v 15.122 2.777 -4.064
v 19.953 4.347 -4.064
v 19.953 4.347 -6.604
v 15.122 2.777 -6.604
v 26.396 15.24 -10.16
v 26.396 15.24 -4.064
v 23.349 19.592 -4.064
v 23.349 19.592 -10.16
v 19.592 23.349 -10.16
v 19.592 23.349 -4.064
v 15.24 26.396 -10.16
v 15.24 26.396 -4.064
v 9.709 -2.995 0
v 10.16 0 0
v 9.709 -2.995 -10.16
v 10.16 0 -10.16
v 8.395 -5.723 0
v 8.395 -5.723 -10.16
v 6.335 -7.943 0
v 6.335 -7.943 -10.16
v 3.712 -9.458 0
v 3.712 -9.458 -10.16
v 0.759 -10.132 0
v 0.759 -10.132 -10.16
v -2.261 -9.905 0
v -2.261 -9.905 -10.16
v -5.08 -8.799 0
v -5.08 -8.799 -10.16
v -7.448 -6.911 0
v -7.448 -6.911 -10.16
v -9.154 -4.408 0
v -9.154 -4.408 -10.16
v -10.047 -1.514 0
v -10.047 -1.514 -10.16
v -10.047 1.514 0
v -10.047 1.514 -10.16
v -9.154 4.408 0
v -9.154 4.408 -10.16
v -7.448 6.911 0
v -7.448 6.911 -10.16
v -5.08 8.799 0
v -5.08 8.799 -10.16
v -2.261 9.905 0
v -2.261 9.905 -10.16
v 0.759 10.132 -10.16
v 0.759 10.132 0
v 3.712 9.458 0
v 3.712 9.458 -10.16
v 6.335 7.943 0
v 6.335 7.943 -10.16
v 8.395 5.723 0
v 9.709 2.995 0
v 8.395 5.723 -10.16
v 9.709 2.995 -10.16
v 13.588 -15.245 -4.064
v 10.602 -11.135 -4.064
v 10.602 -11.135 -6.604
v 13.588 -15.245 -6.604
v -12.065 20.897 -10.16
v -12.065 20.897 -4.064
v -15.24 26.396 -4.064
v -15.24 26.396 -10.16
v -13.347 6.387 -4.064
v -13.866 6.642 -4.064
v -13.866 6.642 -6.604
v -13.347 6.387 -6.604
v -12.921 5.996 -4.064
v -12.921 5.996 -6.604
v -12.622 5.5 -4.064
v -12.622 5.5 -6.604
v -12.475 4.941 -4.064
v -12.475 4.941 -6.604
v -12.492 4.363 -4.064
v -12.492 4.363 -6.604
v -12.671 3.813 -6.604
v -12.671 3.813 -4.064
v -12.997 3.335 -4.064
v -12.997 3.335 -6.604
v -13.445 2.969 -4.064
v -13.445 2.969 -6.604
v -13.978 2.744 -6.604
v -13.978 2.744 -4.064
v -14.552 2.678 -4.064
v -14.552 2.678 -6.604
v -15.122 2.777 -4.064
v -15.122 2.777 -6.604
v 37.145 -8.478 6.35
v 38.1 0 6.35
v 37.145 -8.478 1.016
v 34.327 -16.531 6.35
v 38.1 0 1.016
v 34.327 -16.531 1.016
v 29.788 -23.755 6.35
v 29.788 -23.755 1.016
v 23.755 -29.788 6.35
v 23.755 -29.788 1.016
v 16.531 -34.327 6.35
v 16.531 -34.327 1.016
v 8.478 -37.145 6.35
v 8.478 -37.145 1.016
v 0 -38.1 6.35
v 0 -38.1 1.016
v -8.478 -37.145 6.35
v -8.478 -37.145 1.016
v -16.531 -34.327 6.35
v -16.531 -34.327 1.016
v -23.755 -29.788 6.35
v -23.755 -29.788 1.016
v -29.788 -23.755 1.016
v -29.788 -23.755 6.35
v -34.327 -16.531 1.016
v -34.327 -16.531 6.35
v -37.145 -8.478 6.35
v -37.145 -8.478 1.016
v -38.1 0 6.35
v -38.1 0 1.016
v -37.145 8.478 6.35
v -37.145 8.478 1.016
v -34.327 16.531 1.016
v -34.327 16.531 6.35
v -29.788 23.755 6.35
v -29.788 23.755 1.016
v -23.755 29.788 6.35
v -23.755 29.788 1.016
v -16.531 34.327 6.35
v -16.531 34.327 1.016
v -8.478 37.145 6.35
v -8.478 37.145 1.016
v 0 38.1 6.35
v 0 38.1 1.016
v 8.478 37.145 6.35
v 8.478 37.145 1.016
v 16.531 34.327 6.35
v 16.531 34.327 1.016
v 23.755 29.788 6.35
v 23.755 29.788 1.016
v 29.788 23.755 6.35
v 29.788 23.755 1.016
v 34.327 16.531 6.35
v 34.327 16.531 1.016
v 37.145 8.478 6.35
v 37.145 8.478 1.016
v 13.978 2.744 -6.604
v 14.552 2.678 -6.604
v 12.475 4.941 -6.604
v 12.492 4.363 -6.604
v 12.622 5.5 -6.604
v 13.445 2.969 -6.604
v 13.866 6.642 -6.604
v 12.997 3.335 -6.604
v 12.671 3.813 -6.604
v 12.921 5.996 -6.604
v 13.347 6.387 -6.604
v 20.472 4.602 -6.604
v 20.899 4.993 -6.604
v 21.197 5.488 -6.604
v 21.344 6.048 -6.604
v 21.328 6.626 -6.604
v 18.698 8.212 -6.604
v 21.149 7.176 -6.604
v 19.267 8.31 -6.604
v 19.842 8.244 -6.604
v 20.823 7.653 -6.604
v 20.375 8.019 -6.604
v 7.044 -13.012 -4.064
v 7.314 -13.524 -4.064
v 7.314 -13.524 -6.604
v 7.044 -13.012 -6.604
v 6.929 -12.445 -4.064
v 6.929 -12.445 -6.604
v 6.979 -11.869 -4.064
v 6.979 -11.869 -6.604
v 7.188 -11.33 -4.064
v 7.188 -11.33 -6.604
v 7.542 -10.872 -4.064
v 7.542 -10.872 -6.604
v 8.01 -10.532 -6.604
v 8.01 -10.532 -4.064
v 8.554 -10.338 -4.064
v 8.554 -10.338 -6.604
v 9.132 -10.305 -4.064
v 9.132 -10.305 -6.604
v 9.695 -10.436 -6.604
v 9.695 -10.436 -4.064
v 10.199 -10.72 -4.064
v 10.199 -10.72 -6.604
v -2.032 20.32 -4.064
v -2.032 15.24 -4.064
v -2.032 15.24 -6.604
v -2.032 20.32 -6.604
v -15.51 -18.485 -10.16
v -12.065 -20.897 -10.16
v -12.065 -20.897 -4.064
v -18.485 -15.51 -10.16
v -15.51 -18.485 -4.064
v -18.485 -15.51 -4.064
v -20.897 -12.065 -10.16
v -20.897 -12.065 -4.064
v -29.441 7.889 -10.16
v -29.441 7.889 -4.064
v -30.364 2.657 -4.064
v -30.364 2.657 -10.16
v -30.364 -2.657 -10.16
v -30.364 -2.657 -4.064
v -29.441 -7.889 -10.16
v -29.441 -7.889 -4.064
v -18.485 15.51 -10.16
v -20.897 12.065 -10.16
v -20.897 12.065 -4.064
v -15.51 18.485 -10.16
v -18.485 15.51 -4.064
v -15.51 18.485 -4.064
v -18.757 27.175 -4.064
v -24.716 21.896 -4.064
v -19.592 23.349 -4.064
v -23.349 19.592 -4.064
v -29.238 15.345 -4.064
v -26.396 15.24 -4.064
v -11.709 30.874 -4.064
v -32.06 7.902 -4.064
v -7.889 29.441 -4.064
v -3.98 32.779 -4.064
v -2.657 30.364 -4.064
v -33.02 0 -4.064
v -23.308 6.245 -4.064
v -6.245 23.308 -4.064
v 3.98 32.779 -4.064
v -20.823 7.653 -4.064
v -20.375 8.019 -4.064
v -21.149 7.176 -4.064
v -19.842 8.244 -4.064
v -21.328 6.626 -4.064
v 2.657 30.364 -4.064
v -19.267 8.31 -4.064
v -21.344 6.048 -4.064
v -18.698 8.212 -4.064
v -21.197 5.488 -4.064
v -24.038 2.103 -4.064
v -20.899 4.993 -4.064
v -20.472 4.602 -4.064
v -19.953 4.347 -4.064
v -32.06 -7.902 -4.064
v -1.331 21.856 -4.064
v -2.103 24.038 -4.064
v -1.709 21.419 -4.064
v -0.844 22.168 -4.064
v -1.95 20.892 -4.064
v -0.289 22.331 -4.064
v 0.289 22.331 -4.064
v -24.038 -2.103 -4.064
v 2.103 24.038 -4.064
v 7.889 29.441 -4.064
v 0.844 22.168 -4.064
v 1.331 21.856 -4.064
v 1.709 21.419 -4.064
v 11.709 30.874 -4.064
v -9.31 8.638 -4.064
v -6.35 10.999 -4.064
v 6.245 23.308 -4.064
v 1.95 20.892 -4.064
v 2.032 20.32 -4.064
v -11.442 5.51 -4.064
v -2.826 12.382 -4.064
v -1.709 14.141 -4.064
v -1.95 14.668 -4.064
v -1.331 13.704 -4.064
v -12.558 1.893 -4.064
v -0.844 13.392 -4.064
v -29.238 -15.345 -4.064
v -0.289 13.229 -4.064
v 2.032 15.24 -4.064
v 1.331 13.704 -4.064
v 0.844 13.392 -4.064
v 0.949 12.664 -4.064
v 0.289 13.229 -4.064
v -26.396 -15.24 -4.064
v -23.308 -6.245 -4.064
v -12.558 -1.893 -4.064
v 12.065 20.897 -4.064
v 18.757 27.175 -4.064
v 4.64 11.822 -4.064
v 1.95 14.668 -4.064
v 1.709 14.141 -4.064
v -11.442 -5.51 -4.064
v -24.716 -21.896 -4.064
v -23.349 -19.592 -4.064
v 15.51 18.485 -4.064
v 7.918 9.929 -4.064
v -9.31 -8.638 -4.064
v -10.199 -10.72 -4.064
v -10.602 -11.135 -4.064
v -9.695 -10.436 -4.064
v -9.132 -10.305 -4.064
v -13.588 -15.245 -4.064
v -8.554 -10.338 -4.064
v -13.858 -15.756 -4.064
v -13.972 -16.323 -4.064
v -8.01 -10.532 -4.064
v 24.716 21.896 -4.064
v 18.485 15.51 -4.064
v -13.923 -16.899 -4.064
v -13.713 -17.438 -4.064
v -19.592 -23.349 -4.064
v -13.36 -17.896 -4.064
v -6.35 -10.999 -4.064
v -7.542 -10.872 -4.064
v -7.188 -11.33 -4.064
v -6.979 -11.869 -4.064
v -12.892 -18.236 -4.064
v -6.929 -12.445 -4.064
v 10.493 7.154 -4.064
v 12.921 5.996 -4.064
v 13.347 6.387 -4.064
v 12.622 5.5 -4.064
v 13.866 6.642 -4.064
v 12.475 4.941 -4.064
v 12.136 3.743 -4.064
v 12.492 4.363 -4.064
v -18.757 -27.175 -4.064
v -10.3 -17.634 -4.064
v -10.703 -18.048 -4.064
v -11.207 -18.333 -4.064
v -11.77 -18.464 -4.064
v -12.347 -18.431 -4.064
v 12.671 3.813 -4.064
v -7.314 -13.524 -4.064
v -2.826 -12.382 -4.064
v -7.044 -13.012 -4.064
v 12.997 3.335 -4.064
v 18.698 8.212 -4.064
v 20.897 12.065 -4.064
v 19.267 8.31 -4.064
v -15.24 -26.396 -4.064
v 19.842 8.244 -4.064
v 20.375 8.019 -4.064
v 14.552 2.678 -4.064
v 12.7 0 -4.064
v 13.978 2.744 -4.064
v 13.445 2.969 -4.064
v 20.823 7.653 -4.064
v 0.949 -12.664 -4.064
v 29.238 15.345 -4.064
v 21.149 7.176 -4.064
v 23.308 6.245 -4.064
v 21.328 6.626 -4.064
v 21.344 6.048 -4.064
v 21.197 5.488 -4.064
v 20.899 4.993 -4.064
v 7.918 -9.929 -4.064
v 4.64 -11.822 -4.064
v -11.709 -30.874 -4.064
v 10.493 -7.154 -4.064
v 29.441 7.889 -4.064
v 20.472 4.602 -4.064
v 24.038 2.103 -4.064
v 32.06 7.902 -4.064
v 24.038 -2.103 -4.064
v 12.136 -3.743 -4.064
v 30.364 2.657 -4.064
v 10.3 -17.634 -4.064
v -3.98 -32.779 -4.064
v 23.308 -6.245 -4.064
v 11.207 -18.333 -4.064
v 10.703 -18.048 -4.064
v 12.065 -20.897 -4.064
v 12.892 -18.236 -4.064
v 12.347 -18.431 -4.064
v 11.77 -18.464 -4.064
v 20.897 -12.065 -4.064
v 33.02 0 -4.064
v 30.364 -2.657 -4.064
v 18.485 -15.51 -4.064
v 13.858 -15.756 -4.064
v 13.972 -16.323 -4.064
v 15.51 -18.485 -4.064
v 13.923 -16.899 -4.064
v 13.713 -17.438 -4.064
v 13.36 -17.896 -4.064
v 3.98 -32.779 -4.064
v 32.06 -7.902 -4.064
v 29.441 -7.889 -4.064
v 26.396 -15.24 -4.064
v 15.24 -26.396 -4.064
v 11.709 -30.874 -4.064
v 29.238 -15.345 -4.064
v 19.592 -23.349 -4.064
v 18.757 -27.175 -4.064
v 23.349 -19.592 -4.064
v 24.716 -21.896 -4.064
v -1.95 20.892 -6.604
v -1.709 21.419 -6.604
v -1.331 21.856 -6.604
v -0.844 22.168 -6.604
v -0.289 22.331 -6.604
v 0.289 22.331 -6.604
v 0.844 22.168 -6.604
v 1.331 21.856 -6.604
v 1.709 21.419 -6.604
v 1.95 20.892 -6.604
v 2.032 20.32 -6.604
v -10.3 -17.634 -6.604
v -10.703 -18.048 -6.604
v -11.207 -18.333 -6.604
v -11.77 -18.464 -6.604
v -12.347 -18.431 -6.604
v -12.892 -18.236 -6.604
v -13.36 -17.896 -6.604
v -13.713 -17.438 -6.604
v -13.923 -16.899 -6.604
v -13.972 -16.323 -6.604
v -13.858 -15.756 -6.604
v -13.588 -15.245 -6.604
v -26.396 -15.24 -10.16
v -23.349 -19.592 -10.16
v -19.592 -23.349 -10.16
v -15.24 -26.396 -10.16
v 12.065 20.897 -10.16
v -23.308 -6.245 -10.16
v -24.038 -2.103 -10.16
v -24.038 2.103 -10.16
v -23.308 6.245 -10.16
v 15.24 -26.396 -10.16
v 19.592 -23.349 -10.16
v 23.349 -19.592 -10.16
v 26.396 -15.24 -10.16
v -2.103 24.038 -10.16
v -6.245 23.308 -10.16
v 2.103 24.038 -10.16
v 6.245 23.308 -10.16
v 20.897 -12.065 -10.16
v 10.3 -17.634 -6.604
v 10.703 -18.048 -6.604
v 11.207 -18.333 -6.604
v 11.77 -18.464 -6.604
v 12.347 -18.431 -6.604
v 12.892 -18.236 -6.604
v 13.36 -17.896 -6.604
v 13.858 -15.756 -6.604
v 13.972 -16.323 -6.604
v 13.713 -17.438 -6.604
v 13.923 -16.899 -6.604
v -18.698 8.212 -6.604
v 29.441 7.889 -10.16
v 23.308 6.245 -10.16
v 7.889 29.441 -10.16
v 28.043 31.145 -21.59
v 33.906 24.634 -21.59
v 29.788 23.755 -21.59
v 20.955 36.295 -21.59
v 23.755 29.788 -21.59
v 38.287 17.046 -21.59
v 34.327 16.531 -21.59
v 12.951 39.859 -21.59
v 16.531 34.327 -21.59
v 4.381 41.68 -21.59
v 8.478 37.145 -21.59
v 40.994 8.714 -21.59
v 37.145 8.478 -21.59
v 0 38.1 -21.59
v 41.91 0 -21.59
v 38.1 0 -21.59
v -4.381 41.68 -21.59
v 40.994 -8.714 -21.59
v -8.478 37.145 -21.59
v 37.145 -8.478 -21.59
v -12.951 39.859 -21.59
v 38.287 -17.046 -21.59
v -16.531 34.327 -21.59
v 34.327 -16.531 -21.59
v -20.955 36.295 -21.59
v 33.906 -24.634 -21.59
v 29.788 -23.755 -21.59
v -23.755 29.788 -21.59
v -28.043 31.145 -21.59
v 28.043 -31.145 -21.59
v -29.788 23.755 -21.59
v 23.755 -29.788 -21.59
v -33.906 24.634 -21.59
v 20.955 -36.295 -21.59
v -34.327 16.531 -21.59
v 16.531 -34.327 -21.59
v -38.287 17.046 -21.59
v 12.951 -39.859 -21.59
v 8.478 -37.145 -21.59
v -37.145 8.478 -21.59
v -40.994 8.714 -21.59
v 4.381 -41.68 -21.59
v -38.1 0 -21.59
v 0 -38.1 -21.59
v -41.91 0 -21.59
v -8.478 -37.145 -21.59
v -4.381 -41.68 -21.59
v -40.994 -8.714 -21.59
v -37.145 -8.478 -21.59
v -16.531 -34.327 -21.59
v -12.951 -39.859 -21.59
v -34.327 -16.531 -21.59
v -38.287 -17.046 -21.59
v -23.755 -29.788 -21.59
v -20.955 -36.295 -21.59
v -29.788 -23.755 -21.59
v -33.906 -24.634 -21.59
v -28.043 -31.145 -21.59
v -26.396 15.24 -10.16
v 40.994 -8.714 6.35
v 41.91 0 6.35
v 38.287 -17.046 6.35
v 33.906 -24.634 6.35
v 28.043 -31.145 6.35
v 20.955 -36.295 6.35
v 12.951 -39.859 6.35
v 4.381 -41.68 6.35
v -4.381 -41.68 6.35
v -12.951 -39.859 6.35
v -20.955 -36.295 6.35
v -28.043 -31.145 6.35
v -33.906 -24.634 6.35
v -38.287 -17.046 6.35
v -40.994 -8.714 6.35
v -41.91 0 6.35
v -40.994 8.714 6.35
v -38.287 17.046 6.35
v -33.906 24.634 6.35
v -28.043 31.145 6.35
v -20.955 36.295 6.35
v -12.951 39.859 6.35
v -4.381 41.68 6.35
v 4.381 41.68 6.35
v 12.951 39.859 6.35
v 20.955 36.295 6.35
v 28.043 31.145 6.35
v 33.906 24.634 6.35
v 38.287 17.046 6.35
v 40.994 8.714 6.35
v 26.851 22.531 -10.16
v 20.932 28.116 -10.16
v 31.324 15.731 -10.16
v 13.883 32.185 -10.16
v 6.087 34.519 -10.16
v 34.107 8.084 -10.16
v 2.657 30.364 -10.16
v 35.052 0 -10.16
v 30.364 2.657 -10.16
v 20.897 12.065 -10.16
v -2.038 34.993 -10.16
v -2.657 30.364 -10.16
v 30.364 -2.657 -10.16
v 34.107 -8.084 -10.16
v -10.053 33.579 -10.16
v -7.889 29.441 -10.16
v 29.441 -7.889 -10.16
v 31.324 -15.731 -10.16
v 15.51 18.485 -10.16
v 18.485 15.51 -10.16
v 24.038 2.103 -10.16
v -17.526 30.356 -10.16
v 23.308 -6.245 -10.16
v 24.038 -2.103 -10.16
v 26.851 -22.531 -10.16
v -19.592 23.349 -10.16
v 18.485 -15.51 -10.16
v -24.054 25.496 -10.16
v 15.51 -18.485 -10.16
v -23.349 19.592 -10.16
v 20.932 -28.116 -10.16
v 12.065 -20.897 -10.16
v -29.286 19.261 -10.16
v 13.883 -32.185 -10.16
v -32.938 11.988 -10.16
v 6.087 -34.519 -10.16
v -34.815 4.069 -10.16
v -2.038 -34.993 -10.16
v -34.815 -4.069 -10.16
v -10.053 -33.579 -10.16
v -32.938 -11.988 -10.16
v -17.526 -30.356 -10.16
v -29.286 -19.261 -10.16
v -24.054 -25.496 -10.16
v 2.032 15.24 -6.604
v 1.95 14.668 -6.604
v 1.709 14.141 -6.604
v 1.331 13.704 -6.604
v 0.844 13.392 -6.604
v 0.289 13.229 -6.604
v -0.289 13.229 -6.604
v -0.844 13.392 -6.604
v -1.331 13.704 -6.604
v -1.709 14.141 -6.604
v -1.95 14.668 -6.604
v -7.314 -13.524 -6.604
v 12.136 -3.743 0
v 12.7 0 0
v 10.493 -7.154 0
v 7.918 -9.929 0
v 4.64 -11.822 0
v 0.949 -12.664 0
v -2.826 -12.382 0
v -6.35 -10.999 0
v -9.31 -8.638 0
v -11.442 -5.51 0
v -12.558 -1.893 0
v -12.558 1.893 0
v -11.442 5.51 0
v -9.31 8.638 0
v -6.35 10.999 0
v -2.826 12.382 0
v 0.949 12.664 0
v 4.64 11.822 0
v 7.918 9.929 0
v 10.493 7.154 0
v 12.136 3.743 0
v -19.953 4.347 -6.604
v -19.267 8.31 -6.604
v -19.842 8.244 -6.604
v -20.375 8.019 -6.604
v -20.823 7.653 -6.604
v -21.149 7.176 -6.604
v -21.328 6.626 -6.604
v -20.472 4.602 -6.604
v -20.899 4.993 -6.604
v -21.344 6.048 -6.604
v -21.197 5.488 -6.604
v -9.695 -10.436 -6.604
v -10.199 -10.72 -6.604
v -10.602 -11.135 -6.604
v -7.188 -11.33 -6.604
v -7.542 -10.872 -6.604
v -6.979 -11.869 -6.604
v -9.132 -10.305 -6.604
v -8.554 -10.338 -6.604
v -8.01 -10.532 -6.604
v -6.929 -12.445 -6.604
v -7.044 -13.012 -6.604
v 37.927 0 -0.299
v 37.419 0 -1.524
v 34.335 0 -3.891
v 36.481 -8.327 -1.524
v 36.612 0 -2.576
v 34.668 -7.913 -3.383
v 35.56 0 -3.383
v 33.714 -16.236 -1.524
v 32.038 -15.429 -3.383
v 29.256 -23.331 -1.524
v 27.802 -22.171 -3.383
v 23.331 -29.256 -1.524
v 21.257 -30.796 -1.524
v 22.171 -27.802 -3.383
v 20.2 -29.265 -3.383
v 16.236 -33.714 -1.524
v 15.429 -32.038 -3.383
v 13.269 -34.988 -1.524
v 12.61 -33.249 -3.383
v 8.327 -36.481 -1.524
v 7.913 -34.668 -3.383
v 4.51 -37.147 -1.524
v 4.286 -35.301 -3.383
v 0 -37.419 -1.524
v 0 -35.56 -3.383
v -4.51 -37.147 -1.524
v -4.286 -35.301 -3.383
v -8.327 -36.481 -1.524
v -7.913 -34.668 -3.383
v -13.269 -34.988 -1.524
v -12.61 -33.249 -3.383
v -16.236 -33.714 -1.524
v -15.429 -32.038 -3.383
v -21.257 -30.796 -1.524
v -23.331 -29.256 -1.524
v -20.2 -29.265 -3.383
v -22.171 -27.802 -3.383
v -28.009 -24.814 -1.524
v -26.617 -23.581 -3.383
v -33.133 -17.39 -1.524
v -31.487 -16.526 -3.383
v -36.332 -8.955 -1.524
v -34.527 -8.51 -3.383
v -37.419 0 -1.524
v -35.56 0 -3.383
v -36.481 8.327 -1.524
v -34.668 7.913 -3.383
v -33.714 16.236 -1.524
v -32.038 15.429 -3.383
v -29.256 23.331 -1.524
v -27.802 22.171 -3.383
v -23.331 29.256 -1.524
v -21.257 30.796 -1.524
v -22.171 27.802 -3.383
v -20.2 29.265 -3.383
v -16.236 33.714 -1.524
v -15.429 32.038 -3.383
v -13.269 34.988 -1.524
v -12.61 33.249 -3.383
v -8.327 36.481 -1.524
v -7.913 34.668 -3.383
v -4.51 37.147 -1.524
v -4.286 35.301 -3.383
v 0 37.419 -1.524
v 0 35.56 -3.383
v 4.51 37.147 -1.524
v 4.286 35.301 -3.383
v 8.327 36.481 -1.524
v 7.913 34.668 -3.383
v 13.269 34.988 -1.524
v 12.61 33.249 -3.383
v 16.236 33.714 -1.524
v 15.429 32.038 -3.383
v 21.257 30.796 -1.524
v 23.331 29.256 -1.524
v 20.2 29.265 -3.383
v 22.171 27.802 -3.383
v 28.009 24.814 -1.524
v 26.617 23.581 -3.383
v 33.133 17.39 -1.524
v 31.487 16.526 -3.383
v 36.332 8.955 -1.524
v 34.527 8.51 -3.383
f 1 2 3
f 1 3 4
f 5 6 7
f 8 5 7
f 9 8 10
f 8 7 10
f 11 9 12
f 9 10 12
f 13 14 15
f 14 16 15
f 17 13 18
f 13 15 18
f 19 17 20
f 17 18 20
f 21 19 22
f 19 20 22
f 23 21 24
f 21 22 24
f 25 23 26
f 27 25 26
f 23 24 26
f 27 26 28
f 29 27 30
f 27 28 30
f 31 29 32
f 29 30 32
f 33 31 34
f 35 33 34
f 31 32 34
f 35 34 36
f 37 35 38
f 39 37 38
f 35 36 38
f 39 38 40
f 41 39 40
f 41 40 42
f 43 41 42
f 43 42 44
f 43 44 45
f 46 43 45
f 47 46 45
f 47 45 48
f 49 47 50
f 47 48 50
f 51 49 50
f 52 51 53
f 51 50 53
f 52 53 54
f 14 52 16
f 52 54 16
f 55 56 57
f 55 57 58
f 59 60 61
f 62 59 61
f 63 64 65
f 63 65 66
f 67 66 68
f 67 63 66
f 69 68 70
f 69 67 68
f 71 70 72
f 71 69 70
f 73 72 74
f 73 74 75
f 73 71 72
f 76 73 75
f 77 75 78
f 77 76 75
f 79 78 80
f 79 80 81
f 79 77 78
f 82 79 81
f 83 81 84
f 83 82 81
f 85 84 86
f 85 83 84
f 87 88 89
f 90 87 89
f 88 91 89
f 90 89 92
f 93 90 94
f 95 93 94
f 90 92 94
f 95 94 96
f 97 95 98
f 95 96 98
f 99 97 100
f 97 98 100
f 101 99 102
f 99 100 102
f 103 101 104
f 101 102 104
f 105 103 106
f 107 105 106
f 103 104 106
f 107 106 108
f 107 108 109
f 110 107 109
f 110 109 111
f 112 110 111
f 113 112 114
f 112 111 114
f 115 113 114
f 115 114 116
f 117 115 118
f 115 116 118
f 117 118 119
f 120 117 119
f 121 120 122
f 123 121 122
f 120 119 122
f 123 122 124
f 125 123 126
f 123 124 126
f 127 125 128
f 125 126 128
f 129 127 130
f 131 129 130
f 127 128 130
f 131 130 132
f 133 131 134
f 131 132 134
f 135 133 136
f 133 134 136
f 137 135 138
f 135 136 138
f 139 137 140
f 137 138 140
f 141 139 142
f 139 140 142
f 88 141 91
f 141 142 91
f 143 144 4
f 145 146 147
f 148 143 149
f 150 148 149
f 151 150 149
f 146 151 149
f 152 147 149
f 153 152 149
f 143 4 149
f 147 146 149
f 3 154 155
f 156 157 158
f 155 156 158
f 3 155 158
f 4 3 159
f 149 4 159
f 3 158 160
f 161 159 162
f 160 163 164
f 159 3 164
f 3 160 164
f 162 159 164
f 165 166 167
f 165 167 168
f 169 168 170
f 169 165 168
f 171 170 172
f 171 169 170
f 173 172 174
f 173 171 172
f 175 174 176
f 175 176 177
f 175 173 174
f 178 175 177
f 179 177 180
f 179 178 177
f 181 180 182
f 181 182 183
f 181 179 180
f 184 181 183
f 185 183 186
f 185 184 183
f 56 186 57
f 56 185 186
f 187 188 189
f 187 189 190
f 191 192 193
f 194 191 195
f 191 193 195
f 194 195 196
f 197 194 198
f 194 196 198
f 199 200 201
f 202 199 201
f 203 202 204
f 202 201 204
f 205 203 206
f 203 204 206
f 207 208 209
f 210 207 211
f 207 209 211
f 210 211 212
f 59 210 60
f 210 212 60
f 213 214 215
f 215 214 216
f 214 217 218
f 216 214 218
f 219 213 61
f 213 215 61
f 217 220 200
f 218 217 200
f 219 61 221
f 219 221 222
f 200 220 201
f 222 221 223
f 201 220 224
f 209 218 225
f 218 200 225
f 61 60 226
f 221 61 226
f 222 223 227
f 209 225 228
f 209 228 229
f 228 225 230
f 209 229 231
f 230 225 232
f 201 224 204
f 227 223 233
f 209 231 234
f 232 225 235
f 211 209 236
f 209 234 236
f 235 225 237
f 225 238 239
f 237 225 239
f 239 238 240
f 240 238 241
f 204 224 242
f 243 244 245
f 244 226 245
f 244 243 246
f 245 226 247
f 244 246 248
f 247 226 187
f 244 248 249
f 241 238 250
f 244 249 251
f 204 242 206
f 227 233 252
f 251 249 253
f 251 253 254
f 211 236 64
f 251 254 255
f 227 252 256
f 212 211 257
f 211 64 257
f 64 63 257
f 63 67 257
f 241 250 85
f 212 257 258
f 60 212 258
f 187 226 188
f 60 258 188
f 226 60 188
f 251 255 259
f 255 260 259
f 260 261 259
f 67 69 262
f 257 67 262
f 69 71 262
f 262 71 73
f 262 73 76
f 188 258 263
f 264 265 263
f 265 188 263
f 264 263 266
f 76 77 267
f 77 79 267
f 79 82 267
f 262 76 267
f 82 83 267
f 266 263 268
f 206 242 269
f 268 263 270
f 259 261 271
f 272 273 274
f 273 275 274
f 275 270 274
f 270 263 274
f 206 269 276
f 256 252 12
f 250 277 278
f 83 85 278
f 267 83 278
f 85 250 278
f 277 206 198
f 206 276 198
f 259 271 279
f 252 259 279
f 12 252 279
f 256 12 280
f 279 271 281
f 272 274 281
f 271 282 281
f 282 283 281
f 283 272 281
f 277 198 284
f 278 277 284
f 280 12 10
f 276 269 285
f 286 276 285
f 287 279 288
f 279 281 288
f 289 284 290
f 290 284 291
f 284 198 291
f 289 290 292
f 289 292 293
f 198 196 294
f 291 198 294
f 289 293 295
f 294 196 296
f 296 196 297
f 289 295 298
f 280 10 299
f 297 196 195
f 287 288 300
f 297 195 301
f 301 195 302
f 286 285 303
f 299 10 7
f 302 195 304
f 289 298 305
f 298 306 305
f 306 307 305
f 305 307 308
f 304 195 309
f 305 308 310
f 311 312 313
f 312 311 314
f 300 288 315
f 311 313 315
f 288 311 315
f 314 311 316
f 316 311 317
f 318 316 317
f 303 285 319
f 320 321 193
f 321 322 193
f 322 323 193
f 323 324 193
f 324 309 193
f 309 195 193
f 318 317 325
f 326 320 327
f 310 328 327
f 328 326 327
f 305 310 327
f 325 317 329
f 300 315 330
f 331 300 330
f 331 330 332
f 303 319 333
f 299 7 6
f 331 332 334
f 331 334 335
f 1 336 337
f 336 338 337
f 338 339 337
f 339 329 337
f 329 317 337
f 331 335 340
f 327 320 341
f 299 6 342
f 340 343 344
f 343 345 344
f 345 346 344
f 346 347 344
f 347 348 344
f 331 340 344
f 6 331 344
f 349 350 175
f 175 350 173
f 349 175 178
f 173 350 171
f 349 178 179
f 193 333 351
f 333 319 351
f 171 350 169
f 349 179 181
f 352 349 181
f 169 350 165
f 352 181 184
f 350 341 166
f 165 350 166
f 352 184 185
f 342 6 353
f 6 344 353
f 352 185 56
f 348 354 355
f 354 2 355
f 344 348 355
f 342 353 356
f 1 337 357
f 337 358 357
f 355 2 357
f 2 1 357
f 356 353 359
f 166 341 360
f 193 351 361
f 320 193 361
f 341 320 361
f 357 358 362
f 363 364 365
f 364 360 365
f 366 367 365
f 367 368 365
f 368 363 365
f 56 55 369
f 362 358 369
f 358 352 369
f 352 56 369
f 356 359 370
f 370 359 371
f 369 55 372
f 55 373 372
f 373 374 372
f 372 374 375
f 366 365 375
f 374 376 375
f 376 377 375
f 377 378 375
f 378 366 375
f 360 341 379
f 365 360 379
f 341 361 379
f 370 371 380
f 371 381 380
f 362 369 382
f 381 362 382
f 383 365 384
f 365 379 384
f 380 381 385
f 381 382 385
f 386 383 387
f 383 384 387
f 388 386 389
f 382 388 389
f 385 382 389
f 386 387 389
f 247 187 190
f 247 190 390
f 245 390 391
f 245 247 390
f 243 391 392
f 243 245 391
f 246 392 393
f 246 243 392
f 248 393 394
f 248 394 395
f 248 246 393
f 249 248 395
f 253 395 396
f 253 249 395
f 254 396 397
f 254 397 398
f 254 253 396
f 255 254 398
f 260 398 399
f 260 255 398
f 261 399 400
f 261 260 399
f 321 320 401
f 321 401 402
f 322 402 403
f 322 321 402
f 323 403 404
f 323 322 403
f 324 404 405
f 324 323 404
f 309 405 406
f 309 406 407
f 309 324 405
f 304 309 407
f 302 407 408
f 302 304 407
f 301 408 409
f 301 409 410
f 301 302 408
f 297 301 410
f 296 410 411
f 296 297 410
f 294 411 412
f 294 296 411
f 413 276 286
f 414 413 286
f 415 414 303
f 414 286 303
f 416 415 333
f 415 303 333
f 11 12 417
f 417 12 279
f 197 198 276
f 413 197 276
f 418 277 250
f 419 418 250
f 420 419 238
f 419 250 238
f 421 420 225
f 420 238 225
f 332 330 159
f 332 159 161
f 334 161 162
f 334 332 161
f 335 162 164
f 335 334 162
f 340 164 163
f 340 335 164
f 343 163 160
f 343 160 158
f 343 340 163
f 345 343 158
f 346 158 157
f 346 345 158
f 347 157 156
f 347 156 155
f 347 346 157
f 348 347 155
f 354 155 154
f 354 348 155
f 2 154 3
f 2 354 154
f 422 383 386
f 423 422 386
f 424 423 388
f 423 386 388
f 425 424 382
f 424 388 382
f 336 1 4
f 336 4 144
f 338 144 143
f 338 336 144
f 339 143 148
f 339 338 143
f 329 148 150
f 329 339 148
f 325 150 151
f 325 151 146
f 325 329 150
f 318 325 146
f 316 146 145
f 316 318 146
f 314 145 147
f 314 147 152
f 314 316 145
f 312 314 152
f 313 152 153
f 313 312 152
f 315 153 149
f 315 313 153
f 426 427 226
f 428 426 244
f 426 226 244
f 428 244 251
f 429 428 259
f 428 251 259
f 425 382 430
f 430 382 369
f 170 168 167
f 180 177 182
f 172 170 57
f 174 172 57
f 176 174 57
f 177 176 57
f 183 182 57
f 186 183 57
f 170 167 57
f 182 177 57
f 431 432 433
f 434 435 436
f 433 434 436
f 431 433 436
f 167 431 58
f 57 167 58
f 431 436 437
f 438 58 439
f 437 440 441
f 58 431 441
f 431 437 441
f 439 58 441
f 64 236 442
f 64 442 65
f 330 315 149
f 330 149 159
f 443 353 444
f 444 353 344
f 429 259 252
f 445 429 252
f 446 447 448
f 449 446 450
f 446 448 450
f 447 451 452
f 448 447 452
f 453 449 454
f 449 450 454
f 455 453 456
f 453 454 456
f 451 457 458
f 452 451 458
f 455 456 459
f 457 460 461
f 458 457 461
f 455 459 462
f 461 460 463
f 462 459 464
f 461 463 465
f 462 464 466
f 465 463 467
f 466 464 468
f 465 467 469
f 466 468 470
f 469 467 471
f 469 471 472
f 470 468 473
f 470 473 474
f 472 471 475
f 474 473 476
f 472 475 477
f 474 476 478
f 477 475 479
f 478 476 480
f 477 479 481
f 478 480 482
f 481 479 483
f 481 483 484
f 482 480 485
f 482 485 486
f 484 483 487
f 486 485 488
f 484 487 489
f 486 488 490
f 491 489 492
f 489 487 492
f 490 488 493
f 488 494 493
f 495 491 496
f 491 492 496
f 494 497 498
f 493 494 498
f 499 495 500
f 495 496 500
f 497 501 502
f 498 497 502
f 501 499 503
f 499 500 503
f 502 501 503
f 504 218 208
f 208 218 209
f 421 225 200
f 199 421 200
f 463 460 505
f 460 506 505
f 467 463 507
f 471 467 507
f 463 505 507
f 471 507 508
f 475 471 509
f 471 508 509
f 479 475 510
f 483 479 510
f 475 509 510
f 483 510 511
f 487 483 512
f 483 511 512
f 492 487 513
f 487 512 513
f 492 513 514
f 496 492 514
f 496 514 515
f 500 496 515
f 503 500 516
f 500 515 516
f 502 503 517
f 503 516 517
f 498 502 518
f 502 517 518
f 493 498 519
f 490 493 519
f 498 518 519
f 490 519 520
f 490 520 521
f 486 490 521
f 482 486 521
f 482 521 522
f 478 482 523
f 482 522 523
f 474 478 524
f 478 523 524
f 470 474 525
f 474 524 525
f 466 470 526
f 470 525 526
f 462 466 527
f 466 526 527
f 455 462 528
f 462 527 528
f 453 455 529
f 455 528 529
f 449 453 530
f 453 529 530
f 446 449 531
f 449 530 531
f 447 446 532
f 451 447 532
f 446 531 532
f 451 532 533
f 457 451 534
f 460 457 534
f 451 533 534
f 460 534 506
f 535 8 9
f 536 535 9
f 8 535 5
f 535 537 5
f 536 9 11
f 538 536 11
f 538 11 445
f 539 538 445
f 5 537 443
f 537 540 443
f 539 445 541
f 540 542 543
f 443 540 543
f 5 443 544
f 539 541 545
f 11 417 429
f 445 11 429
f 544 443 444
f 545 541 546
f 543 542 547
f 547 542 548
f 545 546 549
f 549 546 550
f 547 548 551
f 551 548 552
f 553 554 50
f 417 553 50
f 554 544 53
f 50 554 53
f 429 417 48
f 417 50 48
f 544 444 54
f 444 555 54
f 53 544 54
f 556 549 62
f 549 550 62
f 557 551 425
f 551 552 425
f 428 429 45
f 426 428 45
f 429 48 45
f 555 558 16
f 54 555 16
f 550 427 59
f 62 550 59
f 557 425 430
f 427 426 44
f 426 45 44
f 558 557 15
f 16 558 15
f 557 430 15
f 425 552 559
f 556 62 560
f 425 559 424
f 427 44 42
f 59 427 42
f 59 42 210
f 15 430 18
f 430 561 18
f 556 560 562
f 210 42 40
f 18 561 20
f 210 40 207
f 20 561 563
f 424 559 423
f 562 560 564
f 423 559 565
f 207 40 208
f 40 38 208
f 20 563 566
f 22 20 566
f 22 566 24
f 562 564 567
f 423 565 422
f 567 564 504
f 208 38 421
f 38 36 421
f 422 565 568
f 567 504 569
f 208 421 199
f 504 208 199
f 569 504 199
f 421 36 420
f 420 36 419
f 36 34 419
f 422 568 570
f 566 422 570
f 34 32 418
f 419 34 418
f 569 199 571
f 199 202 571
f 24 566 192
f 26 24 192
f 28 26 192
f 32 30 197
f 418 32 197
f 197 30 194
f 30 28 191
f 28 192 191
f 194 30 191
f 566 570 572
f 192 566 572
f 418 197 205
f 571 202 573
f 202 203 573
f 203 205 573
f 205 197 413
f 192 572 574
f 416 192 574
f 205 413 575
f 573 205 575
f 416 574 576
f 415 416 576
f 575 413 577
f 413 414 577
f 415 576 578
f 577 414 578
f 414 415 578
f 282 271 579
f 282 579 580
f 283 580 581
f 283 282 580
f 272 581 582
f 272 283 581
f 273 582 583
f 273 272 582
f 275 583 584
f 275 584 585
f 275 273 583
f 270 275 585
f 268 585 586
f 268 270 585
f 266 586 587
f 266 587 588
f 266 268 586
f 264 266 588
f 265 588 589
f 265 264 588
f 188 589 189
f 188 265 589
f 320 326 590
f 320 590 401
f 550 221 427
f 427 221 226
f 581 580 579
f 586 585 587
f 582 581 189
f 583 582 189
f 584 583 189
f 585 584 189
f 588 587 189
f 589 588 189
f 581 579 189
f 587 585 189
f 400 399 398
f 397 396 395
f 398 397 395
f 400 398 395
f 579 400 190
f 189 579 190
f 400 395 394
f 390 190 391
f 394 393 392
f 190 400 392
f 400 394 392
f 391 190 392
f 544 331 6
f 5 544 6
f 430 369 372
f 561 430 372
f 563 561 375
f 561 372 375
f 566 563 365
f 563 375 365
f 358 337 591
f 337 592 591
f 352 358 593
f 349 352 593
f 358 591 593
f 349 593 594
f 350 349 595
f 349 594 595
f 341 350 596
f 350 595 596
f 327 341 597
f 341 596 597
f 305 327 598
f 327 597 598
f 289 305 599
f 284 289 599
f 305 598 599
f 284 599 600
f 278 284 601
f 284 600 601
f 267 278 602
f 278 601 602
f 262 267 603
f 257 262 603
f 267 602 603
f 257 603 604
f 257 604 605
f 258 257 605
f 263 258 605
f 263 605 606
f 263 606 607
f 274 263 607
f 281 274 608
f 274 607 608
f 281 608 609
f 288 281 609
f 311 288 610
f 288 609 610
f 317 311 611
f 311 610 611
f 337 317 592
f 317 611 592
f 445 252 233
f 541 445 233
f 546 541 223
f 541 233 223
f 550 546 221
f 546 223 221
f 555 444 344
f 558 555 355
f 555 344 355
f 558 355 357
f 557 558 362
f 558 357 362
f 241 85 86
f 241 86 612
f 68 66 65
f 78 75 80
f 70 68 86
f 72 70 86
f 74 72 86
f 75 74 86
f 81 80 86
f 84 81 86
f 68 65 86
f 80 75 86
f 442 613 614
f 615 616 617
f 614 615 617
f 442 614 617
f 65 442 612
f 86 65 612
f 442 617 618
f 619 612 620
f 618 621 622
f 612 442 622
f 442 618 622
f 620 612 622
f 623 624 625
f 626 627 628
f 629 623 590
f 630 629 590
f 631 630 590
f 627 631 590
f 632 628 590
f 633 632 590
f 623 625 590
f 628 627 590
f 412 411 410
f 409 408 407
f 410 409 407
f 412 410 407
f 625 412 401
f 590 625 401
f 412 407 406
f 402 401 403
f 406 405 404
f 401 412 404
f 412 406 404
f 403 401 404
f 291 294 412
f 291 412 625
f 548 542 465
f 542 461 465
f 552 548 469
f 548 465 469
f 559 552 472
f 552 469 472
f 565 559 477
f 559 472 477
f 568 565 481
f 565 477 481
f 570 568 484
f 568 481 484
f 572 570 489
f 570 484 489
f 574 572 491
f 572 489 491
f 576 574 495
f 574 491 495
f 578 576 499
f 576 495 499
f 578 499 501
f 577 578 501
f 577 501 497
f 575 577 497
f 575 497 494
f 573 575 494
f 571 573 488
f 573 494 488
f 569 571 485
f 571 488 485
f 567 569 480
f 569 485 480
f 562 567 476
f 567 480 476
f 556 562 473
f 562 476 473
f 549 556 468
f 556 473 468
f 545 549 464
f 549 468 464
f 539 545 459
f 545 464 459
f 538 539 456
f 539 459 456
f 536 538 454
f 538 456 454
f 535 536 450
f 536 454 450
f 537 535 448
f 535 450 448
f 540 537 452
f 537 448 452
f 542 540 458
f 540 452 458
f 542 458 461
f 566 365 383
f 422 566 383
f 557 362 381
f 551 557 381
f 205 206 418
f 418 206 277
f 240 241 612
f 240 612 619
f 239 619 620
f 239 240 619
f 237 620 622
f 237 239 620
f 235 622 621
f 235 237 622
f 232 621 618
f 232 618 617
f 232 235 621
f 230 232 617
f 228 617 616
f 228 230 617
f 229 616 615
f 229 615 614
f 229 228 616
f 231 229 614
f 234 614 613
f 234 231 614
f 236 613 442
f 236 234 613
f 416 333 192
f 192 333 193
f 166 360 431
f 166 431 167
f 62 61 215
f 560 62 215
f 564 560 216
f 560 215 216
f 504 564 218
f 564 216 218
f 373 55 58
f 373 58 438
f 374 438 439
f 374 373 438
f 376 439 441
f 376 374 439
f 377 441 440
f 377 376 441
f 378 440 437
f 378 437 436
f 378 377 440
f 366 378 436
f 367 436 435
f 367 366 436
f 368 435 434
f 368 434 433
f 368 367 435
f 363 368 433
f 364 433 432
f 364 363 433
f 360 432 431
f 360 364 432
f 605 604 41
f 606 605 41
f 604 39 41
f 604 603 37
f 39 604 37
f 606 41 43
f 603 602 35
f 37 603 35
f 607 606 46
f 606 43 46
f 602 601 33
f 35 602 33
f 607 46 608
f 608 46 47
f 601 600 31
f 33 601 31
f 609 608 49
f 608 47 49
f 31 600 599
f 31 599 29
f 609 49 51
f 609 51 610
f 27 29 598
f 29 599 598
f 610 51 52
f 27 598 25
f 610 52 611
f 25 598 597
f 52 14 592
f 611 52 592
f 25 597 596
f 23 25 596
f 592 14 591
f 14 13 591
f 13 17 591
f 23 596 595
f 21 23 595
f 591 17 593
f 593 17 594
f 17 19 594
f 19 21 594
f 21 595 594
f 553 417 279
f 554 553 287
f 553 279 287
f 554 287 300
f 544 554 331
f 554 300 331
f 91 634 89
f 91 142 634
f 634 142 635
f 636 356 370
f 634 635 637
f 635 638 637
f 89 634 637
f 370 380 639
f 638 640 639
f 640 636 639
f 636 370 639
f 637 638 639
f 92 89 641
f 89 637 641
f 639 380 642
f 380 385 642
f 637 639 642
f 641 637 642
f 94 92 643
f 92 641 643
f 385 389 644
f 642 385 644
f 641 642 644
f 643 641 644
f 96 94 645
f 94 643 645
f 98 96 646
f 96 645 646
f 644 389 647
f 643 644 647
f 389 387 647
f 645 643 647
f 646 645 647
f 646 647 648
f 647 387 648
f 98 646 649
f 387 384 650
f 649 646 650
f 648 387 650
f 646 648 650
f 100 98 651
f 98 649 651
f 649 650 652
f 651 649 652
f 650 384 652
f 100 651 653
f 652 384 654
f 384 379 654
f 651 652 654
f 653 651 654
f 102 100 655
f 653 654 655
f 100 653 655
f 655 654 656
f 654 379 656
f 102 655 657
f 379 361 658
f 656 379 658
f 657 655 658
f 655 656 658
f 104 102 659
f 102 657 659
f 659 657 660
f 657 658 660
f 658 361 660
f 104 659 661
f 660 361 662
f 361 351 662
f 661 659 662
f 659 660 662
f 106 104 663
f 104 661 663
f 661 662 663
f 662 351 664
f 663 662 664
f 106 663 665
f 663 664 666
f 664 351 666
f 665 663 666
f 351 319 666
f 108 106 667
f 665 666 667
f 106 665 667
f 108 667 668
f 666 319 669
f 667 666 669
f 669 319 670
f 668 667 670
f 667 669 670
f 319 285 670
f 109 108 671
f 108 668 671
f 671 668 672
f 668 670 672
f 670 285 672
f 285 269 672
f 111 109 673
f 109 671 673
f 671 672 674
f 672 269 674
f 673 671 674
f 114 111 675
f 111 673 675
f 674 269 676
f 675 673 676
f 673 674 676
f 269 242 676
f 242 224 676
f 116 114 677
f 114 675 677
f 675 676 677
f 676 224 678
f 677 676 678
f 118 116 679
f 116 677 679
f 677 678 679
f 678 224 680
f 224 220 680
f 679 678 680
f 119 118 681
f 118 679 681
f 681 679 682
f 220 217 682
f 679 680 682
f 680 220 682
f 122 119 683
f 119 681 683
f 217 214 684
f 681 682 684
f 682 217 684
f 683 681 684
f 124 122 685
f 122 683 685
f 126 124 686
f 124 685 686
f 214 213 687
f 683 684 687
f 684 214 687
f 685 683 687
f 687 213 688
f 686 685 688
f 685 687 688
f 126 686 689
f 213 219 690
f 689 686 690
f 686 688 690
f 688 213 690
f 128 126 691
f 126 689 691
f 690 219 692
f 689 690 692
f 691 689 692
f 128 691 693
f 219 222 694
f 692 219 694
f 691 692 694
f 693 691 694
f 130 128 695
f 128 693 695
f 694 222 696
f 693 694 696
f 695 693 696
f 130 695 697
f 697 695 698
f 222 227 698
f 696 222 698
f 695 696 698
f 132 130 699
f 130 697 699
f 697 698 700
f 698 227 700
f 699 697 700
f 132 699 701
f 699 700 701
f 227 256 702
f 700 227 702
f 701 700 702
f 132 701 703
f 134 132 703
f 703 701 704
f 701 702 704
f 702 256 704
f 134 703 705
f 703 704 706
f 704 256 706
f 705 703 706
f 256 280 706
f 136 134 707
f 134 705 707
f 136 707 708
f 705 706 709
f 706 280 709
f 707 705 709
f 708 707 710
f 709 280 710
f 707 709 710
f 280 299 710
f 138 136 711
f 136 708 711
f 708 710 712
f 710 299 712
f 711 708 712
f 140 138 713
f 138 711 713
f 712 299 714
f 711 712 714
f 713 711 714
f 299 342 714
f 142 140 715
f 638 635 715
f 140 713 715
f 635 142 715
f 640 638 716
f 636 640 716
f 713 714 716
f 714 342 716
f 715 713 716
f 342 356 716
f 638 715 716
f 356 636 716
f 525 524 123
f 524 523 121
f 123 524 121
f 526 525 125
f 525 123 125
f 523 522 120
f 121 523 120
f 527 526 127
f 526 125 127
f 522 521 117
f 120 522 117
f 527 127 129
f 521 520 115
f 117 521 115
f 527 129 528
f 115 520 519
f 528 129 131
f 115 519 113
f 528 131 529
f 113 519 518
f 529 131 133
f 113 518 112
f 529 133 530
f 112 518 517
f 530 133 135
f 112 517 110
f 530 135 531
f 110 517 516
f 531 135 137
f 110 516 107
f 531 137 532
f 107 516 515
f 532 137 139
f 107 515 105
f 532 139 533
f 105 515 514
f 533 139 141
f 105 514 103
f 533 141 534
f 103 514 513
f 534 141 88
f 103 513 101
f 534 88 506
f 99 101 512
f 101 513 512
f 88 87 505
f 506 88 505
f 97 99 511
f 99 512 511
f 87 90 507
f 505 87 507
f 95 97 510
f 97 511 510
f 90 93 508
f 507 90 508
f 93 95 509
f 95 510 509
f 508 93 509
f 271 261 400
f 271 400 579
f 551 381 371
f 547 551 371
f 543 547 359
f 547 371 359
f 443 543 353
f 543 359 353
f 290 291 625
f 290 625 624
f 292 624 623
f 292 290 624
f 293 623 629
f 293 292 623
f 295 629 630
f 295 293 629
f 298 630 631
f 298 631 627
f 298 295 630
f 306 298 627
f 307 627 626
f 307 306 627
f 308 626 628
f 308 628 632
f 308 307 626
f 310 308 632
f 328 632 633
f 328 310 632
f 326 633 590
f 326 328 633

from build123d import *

# Parameters (mm, degrees)
CUT_EXTRUDE5_DEPTH = 62.806608676
CUT_EXTRUDE6_DEPTH = 2.54
CIRPATTERN1_COUNT  = 5
CIRPATTERN2_COUNT  = 8


with BuildPart() as part:
    # Sketch1 → Revolve1 (revolve)
    with BuildSketch(Plane(origin=(0, 0, 0), x_dir=(0, 0, -1), z_dir=(1, 0, 0))):
        with BuildLine():
            Line((0, 12.7), (0, 10.16))
            Line((0, 10.16), (10.16, 10.16))
            Line((10.16, 10.16), (10.16, 35.052))
            Line((10.16, 35.052), (21.59, 38.1))
            Line((21.59, 38.1), (21.59, 41.91))
            Line((21.59, 41.91), (-6.35, 41.91))
            Line((-6.35, 41.91), (-6.35, 38.1))
            Line((-6.35, 38.1), (-1.016, 38.1))
            ThreePointArc((-1.016, 38.1), (2.576102448, 36.612102448), (4.064, 33.02))
            Line((4.064, 33.02), (4.064, 12.7))
            Line((4.064, 12.7), (0, 12.7))
        make_face()
    revolve(axis=Axis((0, 0, 0), (0, 0, -1)))

    # Sketch2 → Cut-Extrude5 (cut, through all)
    with BuildSketch(Plane.XY.offset(-4.064)):
        with BuildLine():
            Line((-7.888804495, 29.441419185), (-6.245303558, 23.307790188))
            ThreePointArc((-6.245303558, 23.307790188), (0, 24.13), (6.245303558, 23.307790188))
            Line((6.245303558, 23.307790188), (7.888804495, 29.441419185))
            ThreePointArc((7.888804495, 29.441419185), (0, 30.48), (-7.888804495, 29.441419185))
        make_face()
    cut_extrude5 = extrude(amount=-CUT_EXTRUDE5_DEPTH, mode=Mode.SUBTRACT)

    # Sketch2<9> → Cut-Extrude6 (cut)
    with BuildSketch(Plane.XY.offset(-4.064)):
        with BuildLine():
            Line((2.032, 20.32), (2.032, 15.24))
            ThreePointArc((2.032, 15.24), (0, 13.208), (-2.032, 15.24))
            Line((-2.032, 15.24), (-2.032, 20.32))
            ThreePointArc((-2.032, 20.32), (0, 22.352), (2.032, 20.32))
        make_face()
    cut_extrude6 = extrude(amount=-CUT_EXTRUDE6_DEPTH, mode=Mode.SUBTRACT)

    # CirPattern1: Cut-Extrude6 ×5 about axis
    cirpattern1_axis = Axis((0, 0, 0), (0, 0, 1))
    for i in range(1, CIRPATTERN1_COUNT):
        add(cut_extrude6.rotate(cirpattern1_axis, i * 360 / CIRPATTERN1_COUNT), mode=Mode.SUBTRACT)

    # CirPattern2: Cut-Extrude5 ×8 about axis, 1 skipped
    cirpattern2_axis = Axis((0, 0, 0), (0, 0, 1))
    add([cut_extrude5.rotate(cirpattern2_axis, i * 360 / CIRPATTERN2_COUNT) for i in range(1, CIRPATTERN2_COUNT) if i not in (4,)], mode=Mode.SUBTRACT)


solid = part.part
